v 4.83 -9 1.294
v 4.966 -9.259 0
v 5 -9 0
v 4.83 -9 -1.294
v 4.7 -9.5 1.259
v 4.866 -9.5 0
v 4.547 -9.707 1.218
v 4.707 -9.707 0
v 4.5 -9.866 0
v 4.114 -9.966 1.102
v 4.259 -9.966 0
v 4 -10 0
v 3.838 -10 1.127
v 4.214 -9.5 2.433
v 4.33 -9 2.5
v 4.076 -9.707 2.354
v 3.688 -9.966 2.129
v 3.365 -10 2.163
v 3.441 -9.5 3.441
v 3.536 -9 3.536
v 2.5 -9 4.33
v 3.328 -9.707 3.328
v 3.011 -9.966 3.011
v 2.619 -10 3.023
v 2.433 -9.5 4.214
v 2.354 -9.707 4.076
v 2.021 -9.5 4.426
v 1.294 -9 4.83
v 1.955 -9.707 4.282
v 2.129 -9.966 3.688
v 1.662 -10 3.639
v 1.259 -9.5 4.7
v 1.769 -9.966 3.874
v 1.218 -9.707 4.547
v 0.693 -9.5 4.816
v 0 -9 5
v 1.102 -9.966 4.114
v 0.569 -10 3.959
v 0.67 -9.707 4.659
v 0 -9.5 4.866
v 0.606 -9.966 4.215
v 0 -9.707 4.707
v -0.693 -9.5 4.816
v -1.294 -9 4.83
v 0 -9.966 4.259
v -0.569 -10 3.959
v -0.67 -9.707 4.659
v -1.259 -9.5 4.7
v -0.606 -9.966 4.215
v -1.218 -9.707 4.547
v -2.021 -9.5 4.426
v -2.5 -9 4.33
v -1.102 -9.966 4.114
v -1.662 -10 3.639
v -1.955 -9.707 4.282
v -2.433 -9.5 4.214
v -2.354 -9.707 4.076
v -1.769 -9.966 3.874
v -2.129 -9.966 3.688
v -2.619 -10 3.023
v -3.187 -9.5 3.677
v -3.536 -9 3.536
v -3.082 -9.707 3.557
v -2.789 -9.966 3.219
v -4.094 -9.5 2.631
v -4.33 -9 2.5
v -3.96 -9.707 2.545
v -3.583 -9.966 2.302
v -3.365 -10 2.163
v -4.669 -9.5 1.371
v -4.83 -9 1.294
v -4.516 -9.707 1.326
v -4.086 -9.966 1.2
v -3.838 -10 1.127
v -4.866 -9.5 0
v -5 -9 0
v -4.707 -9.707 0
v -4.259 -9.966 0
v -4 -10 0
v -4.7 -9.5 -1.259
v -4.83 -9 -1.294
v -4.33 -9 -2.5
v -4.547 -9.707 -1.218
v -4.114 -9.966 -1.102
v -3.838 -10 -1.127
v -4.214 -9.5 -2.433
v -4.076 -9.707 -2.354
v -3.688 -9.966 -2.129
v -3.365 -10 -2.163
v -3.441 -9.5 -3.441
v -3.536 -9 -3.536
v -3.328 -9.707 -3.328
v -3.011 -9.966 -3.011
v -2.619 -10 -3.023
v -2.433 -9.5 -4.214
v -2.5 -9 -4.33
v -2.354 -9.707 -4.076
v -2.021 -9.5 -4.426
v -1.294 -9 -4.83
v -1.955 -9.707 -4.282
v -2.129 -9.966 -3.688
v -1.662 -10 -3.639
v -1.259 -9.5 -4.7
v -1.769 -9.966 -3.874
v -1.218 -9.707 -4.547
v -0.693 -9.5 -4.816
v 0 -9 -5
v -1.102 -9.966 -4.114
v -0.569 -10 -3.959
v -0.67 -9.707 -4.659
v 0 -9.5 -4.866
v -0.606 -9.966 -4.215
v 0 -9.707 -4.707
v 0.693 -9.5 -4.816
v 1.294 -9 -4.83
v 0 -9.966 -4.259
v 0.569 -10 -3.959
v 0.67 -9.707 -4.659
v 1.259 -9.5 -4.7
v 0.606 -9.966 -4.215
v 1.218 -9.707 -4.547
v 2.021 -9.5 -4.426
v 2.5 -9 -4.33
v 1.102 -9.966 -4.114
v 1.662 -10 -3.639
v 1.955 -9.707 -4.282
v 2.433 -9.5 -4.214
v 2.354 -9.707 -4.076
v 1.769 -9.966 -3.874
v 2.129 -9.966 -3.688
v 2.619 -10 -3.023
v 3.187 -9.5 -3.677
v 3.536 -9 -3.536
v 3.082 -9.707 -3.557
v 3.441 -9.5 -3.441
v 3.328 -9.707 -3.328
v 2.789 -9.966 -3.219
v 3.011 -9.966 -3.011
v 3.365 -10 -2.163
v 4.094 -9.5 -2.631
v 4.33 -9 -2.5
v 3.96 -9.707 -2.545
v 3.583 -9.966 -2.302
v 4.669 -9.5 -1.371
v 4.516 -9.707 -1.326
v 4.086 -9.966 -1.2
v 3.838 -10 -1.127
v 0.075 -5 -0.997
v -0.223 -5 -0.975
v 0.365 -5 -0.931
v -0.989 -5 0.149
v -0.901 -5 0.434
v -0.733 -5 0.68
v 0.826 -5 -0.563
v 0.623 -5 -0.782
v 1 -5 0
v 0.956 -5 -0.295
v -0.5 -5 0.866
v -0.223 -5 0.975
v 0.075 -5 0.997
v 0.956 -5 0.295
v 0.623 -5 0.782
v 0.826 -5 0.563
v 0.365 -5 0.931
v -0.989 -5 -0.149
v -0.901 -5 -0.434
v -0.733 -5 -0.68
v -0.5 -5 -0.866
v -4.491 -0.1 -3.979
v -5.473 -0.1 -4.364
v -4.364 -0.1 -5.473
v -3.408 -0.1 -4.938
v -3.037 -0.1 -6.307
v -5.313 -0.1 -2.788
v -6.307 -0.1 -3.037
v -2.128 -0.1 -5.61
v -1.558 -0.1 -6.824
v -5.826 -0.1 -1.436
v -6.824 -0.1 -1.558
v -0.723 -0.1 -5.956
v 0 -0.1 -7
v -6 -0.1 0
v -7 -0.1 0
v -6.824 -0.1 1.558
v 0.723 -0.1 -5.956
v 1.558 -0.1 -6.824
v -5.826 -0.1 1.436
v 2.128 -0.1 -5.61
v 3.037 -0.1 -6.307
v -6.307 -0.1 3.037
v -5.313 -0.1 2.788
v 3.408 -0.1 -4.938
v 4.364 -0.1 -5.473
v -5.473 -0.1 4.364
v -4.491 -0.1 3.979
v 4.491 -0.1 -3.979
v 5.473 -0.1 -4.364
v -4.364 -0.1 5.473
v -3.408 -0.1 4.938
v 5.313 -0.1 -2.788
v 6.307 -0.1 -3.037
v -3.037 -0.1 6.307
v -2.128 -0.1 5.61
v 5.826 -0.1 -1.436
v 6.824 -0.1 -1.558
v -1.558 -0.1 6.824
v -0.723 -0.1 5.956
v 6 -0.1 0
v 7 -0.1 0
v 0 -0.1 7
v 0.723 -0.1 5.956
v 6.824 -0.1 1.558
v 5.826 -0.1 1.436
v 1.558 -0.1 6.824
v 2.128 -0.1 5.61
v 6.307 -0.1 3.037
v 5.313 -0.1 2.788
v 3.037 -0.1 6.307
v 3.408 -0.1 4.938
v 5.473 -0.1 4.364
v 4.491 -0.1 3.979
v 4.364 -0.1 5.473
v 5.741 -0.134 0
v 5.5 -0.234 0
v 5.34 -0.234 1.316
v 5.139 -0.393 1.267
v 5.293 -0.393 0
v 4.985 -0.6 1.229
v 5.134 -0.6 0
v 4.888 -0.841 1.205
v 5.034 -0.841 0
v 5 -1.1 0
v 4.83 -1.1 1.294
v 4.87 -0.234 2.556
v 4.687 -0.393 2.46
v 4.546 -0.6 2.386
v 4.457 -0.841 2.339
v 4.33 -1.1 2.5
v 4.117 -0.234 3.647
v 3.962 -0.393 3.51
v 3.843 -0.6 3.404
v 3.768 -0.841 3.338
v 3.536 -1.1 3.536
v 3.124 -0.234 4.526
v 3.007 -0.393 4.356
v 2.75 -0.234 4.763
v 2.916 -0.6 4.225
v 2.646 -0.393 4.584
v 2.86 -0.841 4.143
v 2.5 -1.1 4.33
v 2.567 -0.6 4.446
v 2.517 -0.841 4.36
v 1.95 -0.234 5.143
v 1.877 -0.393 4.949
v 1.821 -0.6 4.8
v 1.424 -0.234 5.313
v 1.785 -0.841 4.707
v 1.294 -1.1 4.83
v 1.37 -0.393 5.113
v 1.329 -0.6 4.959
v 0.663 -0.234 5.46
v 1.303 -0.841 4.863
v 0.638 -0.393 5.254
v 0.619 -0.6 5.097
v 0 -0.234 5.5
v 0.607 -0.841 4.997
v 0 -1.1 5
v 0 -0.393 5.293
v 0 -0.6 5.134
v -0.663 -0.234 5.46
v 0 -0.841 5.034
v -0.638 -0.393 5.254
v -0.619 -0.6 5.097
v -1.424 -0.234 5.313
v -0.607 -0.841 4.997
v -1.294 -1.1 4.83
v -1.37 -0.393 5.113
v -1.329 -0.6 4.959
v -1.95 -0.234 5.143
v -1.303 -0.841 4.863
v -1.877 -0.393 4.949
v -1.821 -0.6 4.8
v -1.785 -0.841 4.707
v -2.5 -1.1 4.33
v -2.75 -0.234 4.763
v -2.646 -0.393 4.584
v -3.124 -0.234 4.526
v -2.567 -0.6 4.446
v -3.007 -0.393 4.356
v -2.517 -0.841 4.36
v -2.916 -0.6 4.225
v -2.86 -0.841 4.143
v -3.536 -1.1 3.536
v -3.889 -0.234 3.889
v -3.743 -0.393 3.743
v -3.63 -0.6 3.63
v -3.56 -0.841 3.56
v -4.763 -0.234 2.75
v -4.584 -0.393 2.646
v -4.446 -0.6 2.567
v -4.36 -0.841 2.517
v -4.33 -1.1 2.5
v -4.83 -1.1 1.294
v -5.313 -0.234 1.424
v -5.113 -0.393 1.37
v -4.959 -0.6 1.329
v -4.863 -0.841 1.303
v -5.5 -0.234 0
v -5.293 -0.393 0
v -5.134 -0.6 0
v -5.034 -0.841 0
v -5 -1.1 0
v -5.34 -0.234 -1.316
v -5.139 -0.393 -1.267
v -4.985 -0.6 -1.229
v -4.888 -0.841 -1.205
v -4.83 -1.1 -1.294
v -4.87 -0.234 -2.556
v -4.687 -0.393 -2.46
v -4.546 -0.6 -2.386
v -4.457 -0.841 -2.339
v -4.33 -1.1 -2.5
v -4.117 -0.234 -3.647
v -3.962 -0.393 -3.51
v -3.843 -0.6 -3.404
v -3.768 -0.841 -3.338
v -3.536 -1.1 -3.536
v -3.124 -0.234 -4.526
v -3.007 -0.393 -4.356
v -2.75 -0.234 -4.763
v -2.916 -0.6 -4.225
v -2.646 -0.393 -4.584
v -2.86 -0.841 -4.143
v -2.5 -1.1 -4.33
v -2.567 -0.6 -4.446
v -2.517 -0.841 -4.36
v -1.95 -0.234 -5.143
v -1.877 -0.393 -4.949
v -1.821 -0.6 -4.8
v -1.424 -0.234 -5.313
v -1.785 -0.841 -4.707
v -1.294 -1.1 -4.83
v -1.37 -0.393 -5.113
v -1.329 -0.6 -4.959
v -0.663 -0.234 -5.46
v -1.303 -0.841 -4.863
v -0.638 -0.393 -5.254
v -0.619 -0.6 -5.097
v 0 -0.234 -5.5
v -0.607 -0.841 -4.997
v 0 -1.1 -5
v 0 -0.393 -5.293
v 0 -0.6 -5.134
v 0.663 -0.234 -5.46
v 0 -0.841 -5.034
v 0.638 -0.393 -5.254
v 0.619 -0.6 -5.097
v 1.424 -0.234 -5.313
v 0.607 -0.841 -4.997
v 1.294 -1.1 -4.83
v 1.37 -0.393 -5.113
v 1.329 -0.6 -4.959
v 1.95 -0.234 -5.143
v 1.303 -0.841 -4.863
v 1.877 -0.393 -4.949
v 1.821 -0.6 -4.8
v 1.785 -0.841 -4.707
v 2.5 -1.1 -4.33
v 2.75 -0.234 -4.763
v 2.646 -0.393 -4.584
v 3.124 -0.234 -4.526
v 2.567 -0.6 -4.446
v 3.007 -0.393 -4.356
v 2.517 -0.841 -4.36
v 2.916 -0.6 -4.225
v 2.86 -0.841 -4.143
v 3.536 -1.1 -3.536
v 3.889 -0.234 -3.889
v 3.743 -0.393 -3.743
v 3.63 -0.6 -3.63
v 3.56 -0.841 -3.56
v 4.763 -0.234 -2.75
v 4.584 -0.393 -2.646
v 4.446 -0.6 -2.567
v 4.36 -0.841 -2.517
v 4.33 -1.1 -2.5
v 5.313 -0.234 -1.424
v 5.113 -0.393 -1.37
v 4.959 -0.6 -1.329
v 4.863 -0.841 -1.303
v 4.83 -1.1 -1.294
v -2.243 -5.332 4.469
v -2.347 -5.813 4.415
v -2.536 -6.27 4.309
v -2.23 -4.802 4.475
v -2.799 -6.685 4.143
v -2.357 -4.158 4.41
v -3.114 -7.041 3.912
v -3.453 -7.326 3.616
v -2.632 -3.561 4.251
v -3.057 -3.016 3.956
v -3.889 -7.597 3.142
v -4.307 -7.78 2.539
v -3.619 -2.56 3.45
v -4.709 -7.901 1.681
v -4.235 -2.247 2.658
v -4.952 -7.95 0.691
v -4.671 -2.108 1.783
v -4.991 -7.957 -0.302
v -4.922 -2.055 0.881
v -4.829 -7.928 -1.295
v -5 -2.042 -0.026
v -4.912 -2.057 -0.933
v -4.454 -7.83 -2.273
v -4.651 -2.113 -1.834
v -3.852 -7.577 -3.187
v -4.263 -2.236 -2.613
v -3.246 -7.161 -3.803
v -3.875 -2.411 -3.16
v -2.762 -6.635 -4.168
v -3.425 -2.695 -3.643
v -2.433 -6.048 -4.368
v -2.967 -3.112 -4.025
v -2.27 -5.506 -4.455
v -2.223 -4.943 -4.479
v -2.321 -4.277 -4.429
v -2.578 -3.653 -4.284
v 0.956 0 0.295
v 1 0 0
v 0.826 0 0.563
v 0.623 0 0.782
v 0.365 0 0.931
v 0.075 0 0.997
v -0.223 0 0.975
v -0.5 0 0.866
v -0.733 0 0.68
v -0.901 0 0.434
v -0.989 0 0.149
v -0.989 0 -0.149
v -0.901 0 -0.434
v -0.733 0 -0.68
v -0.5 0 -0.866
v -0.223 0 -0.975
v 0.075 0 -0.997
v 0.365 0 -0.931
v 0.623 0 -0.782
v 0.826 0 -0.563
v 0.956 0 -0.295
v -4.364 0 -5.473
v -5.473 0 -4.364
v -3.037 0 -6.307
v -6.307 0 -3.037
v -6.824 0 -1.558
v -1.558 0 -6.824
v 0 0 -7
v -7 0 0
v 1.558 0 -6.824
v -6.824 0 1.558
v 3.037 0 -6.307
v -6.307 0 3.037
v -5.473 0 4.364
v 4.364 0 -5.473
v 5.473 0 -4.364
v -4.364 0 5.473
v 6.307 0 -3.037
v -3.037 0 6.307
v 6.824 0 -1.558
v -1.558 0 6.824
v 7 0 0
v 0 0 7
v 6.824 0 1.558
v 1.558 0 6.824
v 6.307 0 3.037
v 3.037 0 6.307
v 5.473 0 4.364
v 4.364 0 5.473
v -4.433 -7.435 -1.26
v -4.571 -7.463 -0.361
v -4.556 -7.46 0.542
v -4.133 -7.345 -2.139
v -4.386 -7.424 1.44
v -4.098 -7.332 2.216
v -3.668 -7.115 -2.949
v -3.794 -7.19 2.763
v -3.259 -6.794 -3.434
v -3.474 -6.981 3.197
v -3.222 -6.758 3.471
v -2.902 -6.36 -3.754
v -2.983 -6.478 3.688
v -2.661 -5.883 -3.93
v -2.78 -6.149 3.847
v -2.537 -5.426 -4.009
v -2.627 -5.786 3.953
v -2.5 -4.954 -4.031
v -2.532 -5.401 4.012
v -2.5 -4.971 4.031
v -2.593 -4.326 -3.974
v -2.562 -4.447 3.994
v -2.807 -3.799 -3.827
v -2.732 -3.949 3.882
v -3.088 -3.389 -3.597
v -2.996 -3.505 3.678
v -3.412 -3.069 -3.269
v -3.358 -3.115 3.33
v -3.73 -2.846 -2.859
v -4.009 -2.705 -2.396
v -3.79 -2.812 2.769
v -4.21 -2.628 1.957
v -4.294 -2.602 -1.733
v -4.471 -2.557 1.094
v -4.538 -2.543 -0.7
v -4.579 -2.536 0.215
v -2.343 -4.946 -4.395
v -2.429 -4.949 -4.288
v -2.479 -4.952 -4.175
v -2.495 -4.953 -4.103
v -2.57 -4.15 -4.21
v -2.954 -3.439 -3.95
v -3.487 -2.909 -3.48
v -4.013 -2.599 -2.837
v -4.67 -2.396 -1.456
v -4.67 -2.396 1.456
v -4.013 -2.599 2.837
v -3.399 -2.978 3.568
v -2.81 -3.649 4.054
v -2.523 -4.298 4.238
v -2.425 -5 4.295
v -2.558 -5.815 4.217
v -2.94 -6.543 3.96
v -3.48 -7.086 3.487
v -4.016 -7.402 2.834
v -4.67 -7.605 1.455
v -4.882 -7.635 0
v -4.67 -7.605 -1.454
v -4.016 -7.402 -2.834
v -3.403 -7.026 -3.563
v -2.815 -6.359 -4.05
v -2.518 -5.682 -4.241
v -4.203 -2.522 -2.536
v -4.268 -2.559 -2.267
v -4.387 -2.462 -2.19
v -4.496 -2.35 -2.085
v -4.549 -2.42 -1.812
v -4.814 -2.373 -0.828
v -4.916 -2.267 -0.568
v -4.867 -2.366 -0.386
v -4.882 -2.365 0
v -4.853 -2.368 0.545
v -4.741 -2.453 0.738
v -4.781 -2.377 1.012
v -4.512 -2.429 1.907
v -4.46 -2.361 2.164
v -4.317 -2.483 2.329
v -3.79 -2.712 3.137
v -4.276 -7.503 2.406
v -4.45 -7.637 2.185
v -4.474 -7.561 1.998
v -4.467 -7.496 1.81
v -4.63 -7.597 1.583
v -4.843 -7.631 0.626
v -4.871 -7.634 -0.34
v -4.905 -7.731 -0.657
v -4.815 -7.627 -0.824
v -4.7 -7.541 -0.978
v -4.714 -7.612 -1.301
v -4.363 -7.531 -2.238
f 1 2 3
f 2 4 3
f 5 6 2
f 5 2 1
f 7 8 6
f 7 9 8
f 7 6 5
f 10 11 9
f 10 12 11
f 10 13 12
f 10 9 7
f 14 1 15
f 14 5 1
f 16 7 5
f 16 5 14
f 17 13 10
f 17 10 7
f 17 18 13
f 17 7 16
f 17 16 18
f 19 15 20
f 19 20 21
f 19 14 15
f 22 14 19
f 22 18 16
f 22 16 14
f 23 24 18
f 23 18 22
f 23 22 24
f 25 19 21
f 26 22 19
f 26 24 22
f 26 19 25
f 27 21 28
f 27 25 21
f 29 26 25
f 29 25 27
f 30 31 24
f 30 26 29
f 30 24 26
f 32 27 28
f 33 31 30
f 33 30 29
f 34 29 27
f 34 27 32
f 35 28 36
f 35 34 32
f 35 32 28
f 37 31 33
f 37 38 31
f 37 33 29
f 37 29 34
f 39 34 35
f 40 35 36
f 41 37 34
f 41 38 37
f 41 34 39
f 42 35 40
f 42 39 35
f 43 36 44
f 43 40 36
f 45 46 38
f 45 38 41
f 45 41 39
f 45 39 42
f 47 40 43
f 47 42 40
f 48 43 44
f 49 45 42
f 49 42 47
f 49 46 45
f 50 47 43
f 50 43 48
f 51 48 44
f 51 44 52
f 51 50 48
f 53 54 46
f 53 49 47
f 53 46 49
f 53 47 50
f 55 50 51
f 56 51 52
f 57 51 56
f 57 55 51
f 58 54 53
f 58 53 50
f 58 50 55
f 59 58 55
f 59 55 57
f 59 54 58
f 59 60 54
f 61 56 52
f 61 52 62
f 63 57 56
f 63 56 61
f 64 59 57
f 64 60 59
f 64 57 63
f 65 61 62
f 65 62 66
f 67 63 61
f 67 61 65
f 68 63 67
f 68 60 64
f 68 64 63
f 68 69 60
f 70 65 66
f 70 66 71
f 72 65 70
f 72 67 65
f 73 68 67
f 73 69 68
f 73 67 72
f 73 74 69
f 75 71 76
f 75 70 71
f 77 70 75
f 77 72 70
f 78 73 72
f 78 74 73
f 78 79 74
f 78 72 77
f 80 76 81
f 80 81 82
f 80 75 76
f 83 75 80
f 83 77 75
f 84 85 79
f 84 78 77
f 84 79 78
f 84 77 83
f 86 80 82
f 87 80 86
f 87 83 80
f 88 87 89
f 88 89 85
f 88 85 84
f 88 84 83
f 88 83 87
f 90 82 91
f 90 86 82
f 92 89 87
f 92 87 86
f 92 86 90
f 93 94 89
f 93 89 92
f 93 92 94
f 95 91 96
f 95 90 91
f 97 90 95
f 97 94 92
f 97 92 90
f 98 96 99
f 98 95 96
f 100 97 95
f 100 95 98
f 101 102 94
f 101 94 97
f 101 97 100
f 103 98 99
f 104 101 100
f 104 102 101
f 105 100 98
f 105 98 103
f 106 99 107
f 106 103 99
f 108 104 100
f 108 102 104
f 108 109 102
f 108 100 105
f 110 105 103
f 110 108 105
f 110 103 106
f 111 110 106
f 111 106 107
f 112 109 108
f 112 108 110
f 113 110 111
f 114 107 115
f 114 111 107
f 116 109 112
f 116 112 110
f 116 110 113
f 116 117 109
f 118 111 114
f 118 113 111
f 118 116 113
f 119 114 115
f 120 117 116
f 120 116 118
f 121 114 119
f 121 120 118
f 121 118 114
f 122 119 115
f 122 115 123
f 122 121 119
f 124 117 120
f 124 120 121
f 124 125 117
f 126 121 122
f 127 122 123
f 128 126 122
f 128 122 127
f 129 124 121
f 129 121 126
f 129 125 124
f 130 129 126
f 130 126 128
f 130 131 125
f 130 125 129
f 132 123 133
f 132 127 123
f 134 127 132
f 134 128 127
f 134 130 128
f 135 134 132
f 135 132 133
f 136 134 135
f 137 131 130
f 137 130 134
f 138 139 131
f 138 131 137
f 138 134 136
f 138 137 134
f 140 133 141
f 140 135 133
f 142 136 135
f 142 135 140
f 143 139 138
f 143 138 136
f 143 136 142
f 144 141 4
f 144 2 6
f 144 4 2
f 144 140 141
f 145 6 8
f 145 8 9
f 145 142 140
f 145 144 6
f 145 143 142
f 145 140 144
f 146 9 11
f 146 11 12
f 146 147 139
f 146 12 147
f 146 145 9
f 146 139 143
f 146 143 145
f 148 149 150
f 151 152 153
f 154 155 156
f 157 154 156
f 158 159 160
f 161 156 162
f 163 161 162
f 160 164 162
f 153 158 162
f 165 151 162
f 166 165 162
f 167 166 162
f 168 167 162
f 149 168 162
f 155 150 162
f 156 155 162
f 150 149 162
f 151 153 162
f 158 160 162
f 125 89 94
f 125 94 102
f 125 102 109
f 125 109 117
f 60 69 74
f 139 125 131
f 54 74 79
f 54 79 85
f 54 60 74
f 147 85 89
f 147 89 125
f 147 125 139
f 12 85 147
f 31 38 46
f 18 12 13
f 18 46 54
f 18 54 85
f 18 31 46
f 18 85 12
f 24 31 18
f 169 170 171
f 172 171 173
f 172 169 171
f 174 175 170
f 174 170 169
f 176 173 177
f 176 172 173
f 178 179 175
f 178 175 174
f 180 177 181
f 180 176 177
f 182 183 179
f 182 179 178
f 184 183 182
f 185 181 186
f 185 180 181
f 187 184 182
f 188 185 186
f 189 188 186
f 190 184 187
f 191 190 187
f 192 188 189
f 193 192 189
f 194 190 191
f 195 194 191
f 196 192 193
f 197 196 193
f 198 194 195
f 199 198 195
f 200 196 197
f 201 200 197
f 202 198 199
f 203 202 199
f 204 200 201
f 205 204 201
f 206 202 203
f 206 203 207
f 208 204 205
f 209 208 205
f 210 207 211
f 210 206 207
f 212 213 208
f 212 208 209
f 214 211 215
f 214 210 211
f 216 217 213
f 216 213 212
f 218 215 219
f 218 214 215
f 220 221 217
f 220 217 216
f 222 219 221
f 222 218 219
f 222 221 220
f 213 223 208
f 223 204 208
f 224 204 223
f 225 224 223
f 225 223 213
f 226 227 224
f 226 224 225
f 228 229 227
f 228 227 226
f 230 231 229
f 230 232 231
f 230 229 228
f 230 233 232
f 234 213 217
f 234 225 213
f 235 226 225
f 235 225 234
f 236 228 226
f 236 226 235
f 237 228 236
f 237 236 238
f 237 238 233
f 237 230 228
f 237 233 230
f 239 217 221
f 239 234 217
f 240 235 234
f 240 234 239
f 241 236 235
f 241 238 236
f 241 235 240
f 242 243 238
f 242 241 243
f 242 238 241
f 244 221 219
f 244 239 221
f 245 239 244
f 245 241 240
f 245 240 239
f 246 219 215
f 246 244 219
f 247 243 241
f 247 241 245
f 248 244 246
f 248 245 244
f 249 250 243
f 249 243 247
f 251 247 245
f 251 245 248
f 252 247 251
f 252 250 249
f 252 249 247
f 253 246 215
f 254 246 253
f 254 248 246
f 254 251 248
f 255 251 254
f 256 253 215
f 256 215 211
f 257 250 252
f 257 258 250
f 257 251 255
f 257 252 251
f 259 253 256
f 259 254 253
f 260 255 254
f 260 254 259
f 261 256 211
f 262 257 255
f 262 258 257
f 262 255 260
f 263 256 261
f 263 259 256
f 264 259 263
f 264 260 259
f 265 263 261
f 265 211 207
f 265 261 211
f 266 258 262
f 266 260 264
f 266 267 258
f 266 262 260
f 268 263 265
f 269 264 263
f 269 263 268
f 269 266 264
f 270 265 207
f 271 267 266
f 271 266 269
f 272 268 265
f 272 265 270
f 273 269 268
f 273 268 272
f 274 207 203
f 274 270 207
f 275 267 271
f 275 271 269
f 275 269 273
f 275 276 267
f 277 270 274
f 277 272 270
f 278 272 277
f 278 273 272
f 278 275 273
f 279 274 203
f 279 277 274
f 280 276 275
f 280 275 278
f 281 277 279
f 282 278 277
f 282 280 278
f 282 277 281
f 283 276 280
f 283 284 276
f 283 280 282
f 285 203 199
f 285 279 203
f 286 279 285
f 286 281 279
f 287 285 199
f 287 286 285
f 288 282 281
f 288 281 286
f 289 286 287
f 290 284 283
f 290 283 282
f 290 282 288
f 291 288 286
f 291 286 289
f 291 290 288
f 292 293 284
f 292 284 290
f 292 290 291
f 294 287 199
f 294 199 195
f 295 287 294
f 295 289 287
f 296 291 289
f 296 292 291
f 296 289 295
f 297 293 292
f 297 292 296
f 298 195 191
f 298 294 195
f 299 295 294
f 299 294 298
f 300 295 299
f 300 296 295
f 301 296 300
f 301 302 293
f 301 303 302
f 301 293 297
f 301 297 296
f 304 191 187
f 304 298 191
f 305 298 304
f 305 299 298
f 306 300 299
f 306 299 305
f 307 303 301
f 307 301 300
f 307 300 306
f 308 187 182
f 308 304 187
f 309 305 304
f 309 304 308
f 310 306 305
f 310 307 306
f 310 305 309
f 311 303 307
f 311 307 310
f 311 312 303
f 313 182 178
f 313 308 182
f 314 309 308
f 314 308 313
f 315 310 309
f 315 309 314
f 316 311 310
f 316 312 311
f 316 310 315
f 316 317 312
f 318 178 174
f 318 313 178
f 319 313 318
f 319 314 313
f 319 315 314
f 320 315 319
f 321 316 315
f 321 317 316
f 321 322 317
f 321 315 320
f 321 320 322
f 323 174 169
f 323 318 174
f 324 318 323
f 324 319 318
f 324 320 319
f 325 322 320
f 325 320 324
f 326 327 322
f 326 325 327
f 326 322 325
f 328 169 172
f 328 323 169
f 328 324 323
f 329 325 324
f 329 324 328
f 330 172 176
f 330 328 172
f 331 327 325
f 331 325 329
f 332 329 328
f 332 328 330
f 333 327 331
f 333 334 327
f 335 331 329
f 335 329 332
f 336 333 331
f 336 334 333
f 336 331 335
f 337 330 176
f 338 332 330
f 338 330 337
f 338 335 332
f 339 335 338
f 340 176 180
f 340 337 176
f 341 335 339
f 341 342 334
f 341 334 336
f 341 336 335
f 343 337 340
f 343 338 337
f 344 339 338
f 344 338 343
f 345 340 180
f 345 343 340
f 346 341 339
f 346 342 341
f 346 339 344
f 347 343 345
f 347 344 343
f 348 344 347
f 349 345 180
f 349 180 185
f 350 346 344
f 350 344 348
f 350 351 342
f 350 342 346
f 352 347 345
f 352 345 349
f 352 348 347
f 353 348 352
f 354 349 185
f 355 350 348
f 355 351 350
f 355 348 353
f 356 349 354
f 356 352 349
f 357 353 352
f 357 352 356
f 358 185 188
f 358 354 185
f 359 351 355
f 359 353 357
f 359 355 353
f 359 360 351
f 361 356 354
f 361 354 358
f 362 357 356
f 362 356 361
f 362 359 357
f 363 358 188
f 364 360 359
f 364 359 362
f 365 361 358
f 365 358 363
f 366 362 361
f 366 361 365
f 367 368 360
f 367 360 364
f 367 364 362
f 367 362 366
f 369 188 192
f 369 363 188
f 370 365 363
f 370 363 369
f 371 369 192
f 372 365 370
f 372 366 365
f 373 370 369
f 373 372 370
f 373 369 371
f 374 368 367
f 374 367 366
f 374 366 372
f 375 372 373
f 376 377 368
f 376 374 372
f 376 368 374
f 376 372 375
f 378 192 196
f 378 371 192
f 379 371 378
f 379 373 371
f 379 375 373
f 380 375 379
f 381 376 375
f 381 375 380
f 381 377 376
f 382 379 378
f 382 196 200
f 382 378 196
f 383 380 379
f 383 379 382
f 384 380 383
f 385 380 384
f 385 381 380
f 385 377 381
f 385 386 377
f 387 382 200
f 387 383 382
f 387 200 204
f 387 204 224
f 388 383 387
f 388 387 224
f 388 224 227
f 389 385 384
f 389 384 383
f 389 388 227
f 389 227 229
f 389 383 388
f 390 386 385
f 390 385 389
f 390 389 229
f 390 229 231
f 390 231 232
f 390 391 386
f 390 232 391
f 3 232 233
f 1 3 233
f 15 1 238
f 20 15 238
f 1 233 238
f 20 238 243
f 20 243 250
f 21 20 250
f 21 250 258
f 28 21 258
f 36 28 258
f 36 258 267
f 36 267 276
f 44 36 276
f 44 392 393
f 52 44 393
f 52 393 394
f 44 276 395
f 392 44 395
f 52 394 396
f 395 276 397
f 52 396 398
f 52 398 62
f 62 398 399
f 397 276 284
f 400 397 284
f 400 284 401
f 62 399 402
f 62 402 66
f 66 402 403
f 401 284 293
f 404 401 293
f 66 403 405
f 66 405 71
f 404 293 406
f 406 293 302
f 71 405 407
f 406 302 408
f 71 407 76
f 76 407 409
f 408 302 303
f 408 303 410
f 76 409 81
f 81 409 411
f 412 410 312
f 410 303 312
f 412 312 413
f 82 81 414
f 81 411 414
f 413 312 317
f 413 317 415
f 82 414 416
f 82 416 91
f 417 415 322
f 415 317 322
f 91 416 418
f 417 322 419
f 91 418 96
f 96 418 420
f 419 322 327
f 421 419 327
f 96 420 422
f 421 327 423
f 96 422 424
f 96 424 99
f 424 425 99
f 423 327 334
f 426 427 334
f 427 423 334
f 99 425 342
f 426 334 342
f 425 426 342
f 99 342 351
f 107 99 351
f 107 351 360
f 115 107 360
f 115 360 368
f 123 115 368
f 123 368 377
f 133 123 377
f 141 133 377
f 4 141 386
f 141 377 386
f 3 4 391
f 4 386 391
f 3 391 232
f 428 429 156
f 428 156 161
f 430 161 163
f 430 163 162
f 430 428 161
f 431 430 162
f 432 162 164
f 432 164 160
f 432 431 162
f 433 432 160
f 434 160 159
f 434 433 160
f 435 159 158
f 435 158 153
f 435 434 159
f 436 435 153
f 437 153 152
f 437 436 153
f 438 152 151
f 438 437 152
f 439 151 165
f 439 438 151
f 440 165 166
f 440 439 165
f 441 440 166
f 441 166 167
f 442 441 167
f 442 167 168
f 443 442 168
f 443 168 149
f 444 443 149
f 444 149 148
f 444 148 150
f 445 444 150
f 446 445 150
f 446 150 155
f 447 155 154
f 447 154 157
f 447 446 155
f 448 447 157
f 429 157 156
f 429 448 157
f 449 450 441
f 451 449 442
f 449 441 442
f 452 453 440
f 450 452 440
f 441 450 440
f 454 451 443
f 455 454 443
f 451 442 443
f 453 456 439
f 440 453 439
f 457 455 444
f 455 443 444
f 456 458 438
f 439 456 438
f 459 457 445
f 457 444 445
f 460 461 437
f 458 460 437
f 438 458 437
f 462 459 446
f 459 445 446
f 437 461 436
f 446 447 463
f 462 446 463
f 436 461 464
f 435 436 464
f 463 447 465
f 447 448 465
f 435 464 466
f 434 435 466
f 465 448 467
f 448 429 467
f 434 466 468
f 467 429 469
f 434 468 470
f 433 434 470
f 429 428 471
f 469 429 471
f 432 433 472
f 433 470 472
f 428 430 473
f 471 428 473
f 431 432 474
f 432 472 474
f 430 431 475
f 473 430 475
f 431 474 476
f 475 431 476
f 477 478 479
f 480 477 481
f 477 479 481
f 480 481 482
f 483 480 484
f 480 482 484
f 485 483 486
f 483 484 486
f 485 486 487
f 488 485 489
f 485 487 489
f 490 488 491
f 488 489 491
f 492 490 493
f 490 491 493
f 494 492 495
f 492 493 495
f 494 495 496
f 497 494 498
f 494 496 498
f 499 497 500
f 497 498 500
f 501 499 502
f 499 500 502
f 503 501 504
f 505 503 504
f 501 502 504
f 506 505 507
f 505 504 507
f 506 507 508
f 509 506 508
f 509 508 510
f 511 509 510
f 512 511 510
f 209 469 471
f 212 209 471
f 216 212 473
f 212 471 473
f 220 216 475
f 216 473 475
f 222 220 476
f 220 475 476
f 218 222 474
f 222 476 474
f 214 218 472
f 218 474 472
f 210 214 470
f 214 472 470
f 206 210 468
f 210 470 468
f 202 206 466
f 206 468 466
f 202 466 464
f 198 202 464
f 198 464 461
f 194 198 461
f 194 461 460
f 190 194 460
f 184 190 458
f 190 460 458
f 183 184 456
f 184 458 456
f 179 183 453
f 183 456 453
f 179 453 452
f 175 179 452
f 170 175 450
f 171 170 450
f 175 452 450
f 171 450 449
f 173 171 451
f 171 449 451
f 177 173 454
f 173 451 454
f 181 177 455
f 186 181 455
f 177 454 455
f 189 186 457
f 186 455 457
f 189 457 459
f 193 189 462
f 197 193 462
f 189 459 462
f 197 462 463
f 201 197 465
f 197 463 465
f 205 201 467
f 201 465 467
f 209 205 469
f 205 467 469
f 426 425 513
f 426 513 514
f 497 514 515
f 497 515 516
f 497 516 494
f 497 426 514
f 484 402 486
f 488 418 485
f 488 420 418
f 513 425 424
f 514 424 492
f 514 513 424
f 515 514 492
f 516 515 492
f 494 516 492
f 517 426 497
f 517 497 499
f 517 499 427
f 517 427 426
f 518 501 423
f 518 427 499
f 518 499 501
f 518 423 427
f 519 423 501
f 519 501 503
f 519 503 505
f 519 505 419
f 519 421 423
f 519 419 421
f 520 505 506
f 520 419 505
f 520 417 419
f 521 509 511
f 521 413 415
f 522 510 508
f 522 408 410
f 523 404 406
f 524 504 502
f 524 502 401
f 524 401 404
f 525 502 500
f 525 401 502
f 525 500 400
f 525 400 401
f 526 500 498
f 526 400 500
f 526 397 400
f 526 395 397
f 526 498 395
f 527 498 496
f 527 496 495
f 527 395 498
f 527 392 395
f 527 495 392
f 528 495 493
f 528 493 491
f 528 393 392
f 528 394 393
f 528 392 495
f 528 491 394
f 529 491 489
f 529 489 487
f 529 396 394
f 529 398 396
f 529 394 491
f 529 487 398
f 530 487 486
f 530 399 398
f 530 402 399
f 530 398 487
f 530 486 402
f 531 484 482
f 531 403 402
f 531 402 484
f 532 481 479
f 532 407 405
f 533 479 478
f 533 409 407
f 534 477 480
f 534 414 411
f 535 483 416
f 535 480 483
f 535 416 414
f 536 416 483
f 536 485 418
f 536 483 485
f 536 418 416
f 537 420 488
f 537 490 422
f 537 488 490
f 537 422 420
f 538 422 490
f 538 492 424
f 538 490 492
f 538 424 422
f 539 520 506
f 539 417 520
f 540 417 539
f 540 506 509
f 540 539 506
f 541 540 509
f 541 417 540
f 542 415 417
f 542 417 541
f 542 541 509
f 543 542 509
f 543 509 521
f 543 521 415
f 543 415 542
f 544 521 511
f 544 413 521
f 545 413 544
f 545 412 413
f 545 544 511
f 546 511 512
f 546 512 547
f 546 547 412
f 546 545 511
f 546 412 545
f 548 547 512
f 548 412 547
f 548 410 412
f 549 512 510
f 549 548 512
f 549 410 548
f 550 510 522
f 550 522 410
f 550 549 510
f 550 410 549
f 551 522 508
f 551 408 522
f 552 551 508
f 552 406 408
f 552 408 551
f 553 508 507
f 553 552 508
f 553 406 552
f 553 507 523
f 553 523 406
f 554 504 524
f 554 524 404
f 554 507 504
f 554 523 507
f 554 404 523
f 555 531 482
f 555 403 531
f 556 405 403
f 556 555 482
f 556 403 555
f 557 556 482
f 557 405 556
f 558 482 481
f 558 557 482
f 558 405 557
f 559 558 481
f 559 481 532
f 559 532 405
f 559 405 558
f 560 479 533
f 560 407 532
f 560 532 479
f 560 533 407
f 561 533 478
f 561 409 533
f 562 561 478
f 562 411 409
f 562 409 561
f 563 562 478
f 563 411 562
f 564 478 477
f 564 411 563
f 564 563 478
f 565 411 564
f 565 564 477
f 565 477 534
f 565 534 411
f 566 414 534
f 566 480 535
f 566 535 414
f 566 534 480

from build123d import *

# Parameters (mm, degrees)
F0_R     = 5
F1_DEPTH = 10
F2_R     = 2.5
F3_DEPTH = 12.5
F0_R_2   = 7
F4_DEPTH = 0.1
F5_R     = 1
F6_R     = 0.5
F7_R     = 1
F8_DEPTH = 5


with BuildPart() as f1:
    # F0 (on Front) → F1 (new body)
    with BuildSketch(Plane.XZ):
        Circle(F0_R)
    extrude(amount=F1_DEPTH)

    # F2 (on Top) → F3 (cut, symmetric)
    with BuildSketch(Plane.XY):
        with Locations((-5, -5)):
            Circle(F2_R)
    extrude(amount=F3_DEPTH, both=True, mode=Mode.SUBTRACT)

    # F0 (on Front) → F4 (join)
    with BuildSketch(Plane.XZ):
        Circle(F0_R_2)
        Circle(F0_R, mode=Mode.SUBTRACT)
    extrude(amount=F4_DEPTH)

    # F5
    f5_edges = [f1.edges().sort_by_distance(p)[0] for p in [
        (-5, -0.1, 0),
        (-5, -10, 0),
    ]]
    fillet(f5_edges, radius=F5_R)

    # F6
    f6_edges = [f1.edges().sort_by_distance(p)[0] for p in [
        (5, -5.05, 0),
        (-5, -1.1, 0),
        (-5, -9, 0),
        (-2.5, -5, 4.330127),
    ]]
    fillet(f6_edges, radius=F6_R)

    # F7 (on Front) → F8 (cut)
    with BuildSketch(Plane.XZ):
        Circle(F7_R)
    extrude(amount=F8_DEPTH, mode=Mode.SUBTRACT)


solid = f1.part
